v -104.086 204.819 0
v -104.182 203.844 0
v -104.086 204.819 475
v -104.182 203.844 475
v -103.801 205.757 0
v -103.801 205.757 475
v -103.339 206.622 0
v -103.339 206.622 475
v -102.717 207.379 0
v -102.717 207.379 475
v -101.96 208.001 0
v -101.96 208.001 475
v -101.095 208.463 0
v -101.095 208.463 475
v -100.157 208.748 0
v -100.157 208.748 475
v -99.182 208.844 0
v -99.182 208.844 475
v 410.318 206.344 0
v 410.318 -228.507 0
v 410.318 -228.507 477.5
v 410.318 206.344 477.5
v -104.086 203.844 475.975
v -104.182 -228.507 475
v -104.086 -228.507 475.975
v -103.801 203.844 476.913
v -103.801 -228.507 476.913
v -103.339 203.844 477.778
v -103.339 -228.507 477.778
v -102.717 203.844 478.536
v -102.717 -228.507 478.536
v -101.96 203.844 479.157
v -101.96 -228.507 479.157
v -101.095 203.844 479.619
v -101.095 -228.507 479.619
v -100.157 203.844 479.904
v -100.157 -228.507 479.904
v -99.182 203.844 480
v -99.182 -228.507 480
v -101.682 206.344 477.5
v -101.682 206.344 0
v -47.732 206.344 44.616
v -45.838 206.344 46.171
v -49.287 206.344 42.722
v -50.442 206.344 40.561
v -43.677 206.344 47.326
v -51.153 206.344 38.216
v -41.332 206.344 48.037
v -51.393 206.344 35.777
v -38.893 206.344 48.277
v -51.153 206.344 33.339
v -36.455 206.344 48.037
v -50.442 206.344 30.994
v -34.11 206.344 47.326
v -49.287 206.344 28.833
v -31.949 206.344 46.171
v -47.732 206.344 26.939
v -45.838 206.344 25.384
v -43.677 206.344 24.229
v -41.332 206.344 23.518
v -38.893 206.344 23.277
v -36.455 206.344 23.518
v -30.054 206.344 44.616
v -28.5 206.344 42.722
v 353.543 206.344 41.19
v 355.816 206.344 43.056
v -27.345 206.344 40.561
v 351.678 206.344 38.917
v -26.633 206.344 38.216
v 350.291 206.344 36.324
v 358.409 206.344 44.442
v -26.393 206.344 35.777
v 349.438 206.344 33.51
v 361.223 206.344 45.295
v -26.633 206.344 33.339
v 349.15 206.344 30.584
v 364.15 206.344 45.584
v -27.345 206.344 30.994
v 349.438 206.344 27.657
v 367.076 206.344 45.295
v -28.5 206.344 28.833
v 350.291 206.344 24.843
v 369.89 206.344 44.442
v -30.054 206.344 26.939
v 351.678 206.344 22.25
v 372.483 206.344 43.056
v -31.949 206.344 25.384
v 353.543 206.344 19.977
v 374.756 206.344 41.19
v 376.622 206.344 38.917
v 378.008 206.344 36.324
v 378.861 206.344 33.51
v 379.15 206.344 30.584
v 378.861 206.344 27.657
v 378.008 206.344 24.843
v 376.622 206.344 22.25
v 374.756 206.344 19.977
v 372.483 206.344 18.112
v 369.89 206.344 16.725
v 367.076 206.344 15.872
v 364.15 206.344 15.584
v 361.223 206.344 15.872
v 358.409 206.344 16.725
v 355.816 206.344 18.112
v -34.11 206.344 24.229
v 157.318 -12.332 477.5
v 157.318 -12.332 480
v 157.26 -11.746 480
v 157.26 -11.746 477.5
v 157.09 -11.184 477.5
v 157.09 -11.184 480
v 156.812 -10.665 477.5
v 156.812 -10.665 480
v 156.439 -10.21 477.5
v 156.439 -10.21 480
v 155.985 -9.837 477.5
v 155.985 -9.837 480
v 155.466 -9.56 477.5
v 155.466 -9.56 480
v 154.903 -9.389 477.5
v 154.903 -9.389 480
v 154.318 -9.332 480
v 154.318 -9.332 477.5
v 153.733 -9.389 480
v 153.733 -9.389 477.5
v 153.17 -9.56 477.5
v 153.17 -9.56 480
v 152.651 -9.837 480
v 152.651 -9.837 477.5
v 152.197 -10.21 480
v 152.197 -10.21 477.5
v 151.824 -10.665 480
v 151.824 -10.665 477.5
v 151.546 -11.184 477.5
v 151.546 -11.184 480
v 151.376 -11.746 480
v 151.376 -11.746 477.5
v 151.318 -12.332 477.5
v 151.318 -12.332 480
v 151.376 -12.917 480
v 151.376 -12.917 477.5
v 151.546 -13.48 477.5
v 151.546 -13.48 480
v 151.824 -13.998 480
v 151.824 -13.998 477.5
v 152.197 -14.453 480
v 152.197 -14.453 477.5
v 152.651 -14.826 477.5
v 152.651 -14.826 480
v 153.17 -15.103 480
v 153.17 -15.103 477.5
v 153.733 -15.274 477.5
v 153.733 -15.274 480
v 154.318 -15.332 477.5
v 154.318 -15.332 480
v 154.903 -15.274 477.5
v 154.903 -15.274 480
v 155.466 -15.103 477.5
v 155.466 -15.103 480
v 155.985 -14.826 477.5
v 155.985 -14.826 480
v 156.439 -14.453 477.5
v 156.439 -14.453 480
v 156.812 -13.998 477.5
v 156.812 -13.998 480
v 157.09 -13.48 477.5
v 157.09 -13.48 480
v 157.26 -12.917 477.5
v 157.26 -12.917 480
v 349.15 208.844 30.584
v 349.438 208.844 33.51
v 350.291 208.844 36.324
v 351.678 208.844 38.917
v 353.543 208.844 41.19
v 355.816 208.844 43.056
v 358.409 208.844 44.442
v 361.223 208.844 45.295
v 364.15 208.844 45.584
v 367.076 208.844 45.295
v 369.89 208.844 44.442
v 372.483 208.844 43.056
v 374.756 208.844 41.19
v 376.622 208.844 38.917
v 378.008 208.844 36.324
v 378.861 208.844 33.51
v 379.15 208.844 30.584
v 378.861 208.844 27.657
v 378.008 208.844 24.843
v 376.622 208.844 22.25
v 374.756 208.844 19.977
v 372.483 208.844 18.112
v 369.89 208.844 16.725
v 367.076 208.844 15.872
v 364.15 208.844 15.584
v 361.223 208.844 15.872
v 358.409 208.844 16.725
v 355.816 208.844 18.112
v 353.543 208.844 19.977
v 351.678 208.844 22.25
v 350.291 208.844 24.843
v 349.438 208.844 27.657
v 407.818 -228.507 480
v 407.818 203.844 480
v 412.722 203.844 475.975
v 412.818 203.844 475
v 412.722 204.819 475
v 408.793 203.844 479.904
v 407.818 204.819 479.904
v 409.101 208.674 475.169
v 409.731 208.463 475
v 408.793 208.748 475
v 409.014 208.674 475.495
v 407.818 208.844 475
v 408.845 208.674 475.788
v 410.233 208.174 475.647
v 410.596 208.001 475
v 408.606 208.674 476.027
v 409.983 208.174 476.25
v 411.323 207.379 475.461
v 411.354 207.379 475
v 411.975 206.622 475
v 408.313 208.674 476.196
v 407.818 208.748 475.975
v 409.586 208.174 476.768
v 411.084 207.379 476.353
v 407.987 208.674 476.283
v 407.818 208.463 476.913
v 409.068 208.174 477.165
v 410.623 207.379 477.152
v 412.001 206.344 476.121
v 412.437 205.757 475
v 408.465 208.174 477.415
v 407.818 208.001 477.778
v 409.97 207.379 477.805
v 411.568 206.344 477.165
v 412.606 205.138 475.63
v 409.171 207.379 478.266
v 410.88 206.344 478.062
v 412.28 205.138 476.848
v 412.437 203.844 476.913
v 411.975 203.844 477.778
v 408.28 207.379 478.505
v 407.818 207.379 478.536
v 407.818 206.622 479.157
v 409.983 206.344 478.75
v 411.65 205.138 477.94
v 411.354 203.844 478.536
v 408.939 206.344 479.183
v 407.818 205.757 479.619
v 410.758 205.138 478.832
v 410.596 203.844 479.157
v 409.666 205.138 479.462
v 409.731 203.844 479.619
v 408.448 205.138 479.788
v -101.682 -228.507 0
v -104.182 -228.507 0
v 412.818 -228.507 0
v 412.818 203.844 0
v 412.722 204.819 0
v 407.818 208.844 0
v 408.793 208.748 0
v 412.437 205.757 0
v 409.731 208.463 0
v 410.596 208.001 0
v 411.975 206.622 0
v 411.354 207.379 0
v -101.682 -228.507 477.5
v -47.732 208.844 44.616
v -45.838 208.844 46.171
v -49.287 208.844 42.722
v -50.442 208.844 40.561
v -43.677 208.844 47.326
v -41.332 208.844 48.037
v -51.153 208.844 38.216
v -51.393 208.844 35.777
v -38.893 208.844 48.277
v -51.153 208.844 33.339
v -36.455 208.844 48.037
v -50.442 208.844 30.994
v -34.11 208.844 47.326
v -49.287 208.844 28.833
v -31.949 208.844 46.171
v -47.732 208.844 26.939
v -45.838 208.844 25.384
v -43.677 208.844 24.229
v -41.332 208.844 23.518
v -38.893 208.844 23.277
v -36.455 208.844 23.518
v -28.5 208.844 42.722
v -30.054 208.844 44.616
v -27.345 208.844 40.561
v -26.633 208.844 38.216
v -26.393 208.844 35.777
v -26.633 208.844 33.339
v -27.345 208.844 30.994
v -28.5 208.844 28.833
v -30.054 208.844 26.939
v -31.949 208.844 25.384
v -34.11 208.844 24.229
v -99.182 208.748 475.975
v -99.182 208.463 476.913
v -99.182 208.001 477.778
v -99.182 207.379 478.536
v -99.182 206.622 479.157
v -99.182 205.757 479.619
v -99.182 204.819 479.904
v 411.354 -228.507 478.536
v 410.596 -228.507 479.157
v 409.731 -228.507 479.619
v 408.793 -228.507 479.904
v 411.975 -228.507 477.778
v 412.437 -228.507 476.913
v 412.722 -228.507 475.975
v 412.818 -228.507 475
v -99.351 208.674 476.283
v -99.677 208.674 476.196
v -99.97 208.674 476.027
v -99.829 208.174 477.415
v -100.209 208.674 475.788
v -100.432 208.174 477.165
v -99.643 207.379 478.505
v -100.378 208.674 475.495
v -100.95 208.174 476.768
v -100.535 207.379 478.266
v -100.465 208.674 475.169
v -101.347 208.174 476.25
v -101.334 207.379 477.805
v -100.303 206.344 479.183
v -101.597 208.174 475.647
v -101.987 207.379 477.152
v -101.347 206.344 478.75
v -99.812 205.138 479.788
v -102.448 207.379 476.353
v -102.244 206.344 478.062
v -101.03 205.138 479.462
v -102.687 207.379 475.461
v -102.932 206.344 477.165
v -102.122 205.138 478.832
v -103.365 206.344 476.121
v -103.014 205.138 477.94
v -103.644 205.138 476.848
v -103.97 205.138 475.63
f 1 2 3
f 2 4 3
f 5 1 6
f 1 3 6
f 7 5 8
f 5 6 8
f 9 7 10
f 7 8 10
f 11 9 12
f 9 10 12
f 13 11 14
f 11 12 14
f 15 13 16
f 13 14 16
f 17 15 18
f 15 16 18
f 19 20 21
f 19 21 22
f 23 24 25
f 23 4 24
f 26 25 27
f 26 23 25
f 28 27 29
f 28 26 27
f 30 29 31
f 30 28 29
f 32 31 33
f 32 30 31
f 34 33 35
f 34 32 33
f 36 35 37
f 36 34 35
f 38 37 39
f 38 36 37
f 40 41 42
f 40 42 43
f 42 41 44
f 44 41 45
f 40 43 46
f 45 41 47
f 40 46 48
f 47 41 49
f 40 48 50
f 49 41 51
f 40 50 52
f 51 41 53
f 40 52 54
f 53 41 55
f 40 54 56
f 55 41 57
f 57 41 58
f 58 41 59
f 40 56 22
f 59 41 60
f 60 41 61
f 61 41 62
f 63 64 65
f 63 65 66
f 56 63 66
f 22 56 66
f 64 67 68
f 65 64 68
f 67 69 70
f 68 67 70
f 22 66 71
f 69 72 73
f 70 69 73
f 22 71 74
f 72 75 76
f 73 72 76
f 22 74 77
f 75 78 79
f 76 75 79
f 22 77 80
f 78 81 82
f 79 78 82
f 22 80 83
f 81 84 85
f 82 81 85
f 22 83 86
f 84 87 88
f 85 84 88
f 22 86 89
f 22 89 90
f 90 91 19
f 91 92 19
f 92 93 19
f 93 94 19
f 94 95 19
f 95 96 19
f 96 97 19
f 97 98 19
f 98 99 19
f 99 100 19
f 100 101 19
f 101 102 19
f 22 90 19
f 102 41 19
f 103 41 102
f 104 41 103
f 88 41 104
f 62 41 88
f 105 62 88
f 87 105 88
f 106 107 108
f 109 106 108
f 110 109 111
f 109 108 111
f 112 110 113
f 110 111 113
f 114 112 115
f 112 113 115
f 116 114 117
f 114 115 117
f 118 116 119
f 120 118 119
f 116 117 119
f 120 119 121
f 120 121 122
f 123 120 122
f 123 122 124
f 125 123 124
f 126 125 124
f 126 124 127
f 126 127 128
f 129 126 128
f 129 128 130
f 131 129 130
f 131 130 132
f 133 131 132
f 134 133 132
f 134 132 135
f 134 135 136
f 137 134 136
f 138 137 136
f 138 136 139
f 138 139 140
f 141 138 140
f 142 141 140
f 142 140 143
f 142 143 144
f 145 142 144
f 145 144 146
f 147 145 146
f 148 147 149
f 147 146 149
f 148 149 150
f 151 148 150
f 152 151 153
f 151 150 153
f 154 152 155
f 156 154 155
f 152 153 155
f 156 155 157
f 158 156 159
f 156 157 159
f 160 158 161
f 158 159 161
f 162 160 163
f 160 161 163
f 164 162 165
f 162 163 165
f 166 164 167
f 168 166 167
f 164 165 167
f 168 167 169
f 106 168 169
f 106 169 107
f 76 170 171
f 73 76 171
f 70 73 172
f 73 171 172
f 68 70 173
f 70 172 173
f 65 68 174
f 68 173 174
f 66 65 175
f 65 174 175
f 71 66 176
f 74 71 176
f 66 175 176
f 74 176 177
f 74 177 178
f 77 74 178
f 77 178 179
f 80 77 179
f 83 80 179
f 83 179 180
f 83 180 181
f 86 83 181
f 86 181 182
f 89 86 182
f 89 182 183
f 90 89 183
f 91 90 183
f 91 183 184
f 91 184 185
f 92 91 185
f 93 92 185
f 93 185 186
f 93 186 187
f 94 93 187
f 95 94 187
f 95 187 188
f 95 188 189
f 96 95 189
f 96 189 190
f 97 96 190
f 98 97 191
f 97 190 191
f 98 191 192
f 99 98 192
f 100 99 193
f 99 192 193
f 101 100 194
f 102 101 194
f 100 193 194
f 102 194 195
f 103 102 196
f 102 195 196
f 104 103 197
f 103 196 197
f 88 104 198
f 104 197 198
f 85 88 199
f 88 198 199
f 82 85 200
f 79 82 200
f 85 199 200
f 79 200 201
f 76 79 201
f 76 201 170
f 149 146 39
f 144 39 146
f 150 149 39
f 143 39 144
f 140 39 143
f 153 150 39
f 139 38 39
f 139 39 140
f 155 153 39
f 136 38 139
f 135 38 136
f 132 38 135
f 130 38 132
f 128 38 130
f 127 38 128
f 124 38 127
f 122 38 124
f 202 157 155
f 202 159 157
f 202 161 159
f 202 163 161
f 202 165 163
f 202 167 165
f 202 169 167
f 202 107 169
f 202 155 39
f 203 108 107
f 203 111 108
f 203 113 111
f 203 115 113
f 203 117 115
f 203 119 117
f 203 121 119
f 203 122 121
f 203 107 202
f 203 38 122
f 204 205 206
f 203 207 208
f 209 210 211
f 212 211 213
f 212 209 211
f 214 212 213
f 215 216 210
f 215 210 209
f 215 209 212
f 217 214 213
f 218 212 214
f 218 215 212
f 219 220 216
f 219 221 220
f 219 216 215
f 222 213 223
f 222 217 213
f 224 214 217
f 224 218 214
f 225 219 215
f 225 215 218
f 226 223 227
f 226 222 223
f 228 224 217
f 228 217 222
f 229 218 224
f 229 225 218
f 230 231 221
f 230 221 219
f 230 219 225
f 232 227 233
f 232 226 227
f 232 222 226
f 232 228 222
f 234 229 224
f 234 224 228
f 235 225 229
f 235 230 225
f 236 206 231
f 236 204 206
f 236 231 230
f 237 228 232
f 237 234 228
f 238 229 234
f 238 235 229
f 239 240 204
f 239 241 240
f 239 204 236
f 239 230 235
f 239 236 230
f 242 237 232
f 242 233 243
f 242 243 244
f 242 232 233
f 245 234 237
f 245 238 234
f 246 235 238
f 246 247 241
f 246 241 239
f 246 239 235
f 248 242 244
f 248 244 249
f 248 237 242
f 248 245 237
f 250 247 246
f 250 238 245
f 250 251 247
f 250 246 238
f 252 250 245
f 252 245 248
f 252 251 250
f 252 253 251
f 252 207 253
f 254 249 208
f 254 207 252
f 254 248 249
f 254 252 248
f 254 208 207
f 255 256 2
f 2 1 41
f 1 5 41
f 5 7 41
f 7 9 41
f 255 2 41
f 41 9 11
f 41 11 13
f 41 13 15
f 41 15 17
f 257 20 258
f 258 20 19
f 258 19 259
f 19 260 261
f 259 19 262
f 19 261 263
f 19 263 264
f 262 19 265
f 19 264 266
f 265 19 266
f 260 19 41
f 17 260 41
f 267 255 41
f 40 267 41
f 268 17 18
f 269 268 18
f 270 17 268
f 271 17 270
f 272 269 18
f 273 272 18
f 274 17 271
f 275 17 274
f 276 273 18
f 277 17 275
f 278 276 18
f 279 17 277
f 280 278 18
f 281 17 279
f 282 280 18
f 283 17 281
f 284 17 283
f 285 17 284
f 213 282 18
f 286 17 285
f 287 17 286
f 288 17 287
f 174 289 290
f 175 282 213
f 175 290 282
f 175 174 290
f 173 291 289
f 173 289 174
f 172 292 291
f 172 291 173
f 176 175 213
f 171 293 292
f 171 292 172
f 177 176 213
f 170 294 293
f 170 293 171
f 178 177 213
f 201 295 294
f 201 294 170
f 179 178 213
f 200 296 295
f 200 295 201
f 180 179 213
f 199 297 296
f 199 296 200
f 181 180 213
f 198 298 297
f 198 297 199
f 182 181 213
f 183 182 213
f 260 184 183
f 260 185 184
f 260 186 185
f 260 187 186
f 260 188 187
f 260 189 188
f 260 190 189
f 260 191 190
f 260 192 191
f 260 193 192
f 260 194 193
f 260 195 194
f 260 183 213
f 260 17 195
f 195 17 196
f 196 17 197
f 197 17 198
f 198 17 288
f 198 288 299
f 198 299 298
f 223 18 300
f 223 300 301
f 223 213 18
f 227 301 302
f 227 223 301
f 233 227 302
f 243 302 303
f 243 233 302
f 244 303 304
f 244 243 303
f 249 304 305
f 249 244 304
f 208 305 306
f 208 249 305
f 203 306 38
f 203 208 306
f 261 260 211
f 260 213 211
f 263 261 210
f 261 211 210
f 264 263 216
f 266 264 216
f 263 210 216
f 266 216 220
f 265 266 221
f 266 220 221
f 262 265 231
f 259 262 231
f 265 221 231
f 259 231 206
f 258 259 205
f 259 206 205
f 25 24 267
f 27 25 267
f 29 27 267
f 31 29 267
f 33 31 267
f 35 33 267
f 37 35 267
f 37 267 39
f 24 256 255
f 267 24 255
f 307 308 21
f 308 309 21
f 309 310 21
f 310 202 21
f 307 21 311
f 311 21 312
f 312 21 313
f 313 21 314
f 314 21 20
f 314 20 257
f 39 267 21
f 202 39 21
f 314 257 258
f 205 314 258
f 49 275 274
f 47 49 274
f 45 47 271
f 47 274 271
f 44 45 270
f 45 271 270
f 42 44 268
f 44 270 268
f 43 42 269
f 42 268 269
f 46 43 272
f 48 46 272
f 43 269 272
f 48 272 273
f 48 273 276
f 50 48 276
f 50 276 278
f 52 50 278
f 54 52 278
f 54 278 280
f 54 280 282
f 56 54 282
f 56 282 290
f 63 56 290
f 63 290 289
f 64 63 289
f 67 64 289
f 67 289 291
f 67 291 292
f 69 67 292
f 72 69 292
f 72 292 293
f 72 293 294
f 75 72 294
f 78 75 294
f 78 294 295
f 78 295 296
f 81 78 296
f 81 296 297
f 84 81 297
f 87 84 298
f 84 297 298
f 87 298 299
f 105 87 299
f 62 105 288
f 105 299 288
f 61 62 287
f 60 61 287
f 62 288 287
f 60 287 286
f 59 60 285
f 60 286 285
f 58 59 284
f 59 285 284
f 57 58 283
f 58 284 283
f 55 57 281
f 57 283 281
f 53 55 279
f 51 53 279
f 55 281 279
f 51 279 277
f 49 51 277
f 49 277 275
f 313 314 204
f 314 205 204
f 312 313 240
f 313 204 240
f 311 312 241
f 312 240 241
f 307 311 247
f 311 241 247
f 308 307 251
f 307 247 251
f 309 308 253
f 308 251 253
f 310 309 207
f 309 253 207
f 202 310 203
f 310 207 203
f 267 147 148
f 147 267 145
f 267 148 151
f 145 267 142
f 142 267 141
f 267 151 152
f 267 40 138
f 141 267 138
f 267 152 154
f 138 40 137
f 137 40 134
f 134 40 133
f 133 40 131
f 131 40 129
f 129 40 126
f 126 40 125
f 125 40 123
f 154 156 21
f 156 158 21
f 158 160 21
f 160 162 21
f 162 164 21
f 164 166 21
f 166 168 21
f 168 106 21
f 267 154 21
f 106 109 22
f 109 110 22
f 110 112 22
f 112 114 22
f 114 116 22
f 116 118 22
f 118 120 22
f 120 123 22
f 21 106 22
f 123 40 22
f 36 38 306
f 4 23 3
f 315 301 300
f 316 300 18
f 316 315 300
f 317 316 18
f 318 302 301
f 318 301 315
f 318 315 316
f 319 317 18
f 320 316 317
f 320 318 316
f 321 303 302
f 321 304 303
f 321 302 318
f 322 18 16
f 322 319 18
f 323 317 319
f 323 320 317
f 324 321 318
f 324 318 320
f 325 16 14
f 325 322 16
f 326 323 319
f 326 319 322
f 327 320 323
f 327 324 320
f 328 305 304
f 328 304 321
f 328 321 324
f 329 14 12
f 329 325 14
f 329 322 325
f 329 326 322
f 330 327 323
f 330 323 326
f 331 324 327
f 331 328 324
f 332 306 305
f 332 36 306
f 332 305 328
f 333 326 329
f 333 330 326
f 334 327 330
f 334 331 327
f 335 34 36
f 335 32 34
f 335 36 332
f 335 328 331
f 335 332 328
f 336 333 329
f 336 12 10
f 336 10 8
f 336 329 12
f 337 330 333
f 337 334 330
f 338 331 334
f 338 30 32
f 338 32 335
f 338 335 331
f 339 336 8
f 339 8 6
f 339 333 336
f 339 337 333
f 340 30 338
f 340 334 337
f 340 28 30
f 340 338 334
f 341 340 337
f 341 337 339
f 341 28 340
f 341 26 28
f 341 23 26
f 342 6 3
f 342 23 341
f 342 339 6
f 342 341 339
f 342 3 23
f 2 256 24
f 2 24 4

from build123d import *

# Parameters (mm, degrees)
F0_W     = 517
F0_H     = 437.351066
F1_DEPTH = 480
F2_T     = -2.5
F3_R     = 5
F5_R     = 15
F5_R_2   = 12.5
F6_DEPTH = 11.75
F7_R     = 3
F8_DEPTH = 12.5


with BuildPart() as f1:
    # F0 (on Top) → F1 (new body)
    with BuildSketch(Plane.XY):
        with Locations((154.318035, -9.831567)):
            Rectangle(F0_W, F0_H)
    extrude(amount=F1_DEPTH)

    # F2
    f2_openings = [f1.faces().sort_by_distance(p)[0] for p in [
        (154.318035, -228.5071, 240),
        (154.318035, -9.831567, 0),
    ]]
    offset(amount=F2_T, openings=f2_openings)

    # F3
    f3_edges = [f1.edges().sort_by_distance(p)[0] for p in [
        (412.818035, -9.831567, 480),
        (-104.181965, -9.831567, 480),
        (412.818035, 208.843966, 240),
        (154.318035, 208.843966, 480),
        (-104.181965, 208.843966, 240),
    ]]
    fillet(f3_edges, radius=F3_R)

    # F5 (on face) → F6 (cut)
    with BuildSketch(Plane(origin=(0, 208.843966, 0), x_dir=(-1, 0, 0), z_dir=(0, 1, 0))):
        with Locations((-364.1496, 30.58356)):
            Circle(F5_R)
        with Locations((38.893182, 35.777409)):
            Circle(F5_R_2)
    extrude(amount=-F6_DEPTH, mode=Mode.SUBTRACT)

    # F7 (on face) → F8 (cut)
    with BuildSketch(Plane.XY.offset(480)):
        with Locations((154.318035, -12.331567)):
            Circle(F7_R)
    extrude(amount=-F8_DEPTH, mode=Mode.SUBTRACT)


solid = f1.part
